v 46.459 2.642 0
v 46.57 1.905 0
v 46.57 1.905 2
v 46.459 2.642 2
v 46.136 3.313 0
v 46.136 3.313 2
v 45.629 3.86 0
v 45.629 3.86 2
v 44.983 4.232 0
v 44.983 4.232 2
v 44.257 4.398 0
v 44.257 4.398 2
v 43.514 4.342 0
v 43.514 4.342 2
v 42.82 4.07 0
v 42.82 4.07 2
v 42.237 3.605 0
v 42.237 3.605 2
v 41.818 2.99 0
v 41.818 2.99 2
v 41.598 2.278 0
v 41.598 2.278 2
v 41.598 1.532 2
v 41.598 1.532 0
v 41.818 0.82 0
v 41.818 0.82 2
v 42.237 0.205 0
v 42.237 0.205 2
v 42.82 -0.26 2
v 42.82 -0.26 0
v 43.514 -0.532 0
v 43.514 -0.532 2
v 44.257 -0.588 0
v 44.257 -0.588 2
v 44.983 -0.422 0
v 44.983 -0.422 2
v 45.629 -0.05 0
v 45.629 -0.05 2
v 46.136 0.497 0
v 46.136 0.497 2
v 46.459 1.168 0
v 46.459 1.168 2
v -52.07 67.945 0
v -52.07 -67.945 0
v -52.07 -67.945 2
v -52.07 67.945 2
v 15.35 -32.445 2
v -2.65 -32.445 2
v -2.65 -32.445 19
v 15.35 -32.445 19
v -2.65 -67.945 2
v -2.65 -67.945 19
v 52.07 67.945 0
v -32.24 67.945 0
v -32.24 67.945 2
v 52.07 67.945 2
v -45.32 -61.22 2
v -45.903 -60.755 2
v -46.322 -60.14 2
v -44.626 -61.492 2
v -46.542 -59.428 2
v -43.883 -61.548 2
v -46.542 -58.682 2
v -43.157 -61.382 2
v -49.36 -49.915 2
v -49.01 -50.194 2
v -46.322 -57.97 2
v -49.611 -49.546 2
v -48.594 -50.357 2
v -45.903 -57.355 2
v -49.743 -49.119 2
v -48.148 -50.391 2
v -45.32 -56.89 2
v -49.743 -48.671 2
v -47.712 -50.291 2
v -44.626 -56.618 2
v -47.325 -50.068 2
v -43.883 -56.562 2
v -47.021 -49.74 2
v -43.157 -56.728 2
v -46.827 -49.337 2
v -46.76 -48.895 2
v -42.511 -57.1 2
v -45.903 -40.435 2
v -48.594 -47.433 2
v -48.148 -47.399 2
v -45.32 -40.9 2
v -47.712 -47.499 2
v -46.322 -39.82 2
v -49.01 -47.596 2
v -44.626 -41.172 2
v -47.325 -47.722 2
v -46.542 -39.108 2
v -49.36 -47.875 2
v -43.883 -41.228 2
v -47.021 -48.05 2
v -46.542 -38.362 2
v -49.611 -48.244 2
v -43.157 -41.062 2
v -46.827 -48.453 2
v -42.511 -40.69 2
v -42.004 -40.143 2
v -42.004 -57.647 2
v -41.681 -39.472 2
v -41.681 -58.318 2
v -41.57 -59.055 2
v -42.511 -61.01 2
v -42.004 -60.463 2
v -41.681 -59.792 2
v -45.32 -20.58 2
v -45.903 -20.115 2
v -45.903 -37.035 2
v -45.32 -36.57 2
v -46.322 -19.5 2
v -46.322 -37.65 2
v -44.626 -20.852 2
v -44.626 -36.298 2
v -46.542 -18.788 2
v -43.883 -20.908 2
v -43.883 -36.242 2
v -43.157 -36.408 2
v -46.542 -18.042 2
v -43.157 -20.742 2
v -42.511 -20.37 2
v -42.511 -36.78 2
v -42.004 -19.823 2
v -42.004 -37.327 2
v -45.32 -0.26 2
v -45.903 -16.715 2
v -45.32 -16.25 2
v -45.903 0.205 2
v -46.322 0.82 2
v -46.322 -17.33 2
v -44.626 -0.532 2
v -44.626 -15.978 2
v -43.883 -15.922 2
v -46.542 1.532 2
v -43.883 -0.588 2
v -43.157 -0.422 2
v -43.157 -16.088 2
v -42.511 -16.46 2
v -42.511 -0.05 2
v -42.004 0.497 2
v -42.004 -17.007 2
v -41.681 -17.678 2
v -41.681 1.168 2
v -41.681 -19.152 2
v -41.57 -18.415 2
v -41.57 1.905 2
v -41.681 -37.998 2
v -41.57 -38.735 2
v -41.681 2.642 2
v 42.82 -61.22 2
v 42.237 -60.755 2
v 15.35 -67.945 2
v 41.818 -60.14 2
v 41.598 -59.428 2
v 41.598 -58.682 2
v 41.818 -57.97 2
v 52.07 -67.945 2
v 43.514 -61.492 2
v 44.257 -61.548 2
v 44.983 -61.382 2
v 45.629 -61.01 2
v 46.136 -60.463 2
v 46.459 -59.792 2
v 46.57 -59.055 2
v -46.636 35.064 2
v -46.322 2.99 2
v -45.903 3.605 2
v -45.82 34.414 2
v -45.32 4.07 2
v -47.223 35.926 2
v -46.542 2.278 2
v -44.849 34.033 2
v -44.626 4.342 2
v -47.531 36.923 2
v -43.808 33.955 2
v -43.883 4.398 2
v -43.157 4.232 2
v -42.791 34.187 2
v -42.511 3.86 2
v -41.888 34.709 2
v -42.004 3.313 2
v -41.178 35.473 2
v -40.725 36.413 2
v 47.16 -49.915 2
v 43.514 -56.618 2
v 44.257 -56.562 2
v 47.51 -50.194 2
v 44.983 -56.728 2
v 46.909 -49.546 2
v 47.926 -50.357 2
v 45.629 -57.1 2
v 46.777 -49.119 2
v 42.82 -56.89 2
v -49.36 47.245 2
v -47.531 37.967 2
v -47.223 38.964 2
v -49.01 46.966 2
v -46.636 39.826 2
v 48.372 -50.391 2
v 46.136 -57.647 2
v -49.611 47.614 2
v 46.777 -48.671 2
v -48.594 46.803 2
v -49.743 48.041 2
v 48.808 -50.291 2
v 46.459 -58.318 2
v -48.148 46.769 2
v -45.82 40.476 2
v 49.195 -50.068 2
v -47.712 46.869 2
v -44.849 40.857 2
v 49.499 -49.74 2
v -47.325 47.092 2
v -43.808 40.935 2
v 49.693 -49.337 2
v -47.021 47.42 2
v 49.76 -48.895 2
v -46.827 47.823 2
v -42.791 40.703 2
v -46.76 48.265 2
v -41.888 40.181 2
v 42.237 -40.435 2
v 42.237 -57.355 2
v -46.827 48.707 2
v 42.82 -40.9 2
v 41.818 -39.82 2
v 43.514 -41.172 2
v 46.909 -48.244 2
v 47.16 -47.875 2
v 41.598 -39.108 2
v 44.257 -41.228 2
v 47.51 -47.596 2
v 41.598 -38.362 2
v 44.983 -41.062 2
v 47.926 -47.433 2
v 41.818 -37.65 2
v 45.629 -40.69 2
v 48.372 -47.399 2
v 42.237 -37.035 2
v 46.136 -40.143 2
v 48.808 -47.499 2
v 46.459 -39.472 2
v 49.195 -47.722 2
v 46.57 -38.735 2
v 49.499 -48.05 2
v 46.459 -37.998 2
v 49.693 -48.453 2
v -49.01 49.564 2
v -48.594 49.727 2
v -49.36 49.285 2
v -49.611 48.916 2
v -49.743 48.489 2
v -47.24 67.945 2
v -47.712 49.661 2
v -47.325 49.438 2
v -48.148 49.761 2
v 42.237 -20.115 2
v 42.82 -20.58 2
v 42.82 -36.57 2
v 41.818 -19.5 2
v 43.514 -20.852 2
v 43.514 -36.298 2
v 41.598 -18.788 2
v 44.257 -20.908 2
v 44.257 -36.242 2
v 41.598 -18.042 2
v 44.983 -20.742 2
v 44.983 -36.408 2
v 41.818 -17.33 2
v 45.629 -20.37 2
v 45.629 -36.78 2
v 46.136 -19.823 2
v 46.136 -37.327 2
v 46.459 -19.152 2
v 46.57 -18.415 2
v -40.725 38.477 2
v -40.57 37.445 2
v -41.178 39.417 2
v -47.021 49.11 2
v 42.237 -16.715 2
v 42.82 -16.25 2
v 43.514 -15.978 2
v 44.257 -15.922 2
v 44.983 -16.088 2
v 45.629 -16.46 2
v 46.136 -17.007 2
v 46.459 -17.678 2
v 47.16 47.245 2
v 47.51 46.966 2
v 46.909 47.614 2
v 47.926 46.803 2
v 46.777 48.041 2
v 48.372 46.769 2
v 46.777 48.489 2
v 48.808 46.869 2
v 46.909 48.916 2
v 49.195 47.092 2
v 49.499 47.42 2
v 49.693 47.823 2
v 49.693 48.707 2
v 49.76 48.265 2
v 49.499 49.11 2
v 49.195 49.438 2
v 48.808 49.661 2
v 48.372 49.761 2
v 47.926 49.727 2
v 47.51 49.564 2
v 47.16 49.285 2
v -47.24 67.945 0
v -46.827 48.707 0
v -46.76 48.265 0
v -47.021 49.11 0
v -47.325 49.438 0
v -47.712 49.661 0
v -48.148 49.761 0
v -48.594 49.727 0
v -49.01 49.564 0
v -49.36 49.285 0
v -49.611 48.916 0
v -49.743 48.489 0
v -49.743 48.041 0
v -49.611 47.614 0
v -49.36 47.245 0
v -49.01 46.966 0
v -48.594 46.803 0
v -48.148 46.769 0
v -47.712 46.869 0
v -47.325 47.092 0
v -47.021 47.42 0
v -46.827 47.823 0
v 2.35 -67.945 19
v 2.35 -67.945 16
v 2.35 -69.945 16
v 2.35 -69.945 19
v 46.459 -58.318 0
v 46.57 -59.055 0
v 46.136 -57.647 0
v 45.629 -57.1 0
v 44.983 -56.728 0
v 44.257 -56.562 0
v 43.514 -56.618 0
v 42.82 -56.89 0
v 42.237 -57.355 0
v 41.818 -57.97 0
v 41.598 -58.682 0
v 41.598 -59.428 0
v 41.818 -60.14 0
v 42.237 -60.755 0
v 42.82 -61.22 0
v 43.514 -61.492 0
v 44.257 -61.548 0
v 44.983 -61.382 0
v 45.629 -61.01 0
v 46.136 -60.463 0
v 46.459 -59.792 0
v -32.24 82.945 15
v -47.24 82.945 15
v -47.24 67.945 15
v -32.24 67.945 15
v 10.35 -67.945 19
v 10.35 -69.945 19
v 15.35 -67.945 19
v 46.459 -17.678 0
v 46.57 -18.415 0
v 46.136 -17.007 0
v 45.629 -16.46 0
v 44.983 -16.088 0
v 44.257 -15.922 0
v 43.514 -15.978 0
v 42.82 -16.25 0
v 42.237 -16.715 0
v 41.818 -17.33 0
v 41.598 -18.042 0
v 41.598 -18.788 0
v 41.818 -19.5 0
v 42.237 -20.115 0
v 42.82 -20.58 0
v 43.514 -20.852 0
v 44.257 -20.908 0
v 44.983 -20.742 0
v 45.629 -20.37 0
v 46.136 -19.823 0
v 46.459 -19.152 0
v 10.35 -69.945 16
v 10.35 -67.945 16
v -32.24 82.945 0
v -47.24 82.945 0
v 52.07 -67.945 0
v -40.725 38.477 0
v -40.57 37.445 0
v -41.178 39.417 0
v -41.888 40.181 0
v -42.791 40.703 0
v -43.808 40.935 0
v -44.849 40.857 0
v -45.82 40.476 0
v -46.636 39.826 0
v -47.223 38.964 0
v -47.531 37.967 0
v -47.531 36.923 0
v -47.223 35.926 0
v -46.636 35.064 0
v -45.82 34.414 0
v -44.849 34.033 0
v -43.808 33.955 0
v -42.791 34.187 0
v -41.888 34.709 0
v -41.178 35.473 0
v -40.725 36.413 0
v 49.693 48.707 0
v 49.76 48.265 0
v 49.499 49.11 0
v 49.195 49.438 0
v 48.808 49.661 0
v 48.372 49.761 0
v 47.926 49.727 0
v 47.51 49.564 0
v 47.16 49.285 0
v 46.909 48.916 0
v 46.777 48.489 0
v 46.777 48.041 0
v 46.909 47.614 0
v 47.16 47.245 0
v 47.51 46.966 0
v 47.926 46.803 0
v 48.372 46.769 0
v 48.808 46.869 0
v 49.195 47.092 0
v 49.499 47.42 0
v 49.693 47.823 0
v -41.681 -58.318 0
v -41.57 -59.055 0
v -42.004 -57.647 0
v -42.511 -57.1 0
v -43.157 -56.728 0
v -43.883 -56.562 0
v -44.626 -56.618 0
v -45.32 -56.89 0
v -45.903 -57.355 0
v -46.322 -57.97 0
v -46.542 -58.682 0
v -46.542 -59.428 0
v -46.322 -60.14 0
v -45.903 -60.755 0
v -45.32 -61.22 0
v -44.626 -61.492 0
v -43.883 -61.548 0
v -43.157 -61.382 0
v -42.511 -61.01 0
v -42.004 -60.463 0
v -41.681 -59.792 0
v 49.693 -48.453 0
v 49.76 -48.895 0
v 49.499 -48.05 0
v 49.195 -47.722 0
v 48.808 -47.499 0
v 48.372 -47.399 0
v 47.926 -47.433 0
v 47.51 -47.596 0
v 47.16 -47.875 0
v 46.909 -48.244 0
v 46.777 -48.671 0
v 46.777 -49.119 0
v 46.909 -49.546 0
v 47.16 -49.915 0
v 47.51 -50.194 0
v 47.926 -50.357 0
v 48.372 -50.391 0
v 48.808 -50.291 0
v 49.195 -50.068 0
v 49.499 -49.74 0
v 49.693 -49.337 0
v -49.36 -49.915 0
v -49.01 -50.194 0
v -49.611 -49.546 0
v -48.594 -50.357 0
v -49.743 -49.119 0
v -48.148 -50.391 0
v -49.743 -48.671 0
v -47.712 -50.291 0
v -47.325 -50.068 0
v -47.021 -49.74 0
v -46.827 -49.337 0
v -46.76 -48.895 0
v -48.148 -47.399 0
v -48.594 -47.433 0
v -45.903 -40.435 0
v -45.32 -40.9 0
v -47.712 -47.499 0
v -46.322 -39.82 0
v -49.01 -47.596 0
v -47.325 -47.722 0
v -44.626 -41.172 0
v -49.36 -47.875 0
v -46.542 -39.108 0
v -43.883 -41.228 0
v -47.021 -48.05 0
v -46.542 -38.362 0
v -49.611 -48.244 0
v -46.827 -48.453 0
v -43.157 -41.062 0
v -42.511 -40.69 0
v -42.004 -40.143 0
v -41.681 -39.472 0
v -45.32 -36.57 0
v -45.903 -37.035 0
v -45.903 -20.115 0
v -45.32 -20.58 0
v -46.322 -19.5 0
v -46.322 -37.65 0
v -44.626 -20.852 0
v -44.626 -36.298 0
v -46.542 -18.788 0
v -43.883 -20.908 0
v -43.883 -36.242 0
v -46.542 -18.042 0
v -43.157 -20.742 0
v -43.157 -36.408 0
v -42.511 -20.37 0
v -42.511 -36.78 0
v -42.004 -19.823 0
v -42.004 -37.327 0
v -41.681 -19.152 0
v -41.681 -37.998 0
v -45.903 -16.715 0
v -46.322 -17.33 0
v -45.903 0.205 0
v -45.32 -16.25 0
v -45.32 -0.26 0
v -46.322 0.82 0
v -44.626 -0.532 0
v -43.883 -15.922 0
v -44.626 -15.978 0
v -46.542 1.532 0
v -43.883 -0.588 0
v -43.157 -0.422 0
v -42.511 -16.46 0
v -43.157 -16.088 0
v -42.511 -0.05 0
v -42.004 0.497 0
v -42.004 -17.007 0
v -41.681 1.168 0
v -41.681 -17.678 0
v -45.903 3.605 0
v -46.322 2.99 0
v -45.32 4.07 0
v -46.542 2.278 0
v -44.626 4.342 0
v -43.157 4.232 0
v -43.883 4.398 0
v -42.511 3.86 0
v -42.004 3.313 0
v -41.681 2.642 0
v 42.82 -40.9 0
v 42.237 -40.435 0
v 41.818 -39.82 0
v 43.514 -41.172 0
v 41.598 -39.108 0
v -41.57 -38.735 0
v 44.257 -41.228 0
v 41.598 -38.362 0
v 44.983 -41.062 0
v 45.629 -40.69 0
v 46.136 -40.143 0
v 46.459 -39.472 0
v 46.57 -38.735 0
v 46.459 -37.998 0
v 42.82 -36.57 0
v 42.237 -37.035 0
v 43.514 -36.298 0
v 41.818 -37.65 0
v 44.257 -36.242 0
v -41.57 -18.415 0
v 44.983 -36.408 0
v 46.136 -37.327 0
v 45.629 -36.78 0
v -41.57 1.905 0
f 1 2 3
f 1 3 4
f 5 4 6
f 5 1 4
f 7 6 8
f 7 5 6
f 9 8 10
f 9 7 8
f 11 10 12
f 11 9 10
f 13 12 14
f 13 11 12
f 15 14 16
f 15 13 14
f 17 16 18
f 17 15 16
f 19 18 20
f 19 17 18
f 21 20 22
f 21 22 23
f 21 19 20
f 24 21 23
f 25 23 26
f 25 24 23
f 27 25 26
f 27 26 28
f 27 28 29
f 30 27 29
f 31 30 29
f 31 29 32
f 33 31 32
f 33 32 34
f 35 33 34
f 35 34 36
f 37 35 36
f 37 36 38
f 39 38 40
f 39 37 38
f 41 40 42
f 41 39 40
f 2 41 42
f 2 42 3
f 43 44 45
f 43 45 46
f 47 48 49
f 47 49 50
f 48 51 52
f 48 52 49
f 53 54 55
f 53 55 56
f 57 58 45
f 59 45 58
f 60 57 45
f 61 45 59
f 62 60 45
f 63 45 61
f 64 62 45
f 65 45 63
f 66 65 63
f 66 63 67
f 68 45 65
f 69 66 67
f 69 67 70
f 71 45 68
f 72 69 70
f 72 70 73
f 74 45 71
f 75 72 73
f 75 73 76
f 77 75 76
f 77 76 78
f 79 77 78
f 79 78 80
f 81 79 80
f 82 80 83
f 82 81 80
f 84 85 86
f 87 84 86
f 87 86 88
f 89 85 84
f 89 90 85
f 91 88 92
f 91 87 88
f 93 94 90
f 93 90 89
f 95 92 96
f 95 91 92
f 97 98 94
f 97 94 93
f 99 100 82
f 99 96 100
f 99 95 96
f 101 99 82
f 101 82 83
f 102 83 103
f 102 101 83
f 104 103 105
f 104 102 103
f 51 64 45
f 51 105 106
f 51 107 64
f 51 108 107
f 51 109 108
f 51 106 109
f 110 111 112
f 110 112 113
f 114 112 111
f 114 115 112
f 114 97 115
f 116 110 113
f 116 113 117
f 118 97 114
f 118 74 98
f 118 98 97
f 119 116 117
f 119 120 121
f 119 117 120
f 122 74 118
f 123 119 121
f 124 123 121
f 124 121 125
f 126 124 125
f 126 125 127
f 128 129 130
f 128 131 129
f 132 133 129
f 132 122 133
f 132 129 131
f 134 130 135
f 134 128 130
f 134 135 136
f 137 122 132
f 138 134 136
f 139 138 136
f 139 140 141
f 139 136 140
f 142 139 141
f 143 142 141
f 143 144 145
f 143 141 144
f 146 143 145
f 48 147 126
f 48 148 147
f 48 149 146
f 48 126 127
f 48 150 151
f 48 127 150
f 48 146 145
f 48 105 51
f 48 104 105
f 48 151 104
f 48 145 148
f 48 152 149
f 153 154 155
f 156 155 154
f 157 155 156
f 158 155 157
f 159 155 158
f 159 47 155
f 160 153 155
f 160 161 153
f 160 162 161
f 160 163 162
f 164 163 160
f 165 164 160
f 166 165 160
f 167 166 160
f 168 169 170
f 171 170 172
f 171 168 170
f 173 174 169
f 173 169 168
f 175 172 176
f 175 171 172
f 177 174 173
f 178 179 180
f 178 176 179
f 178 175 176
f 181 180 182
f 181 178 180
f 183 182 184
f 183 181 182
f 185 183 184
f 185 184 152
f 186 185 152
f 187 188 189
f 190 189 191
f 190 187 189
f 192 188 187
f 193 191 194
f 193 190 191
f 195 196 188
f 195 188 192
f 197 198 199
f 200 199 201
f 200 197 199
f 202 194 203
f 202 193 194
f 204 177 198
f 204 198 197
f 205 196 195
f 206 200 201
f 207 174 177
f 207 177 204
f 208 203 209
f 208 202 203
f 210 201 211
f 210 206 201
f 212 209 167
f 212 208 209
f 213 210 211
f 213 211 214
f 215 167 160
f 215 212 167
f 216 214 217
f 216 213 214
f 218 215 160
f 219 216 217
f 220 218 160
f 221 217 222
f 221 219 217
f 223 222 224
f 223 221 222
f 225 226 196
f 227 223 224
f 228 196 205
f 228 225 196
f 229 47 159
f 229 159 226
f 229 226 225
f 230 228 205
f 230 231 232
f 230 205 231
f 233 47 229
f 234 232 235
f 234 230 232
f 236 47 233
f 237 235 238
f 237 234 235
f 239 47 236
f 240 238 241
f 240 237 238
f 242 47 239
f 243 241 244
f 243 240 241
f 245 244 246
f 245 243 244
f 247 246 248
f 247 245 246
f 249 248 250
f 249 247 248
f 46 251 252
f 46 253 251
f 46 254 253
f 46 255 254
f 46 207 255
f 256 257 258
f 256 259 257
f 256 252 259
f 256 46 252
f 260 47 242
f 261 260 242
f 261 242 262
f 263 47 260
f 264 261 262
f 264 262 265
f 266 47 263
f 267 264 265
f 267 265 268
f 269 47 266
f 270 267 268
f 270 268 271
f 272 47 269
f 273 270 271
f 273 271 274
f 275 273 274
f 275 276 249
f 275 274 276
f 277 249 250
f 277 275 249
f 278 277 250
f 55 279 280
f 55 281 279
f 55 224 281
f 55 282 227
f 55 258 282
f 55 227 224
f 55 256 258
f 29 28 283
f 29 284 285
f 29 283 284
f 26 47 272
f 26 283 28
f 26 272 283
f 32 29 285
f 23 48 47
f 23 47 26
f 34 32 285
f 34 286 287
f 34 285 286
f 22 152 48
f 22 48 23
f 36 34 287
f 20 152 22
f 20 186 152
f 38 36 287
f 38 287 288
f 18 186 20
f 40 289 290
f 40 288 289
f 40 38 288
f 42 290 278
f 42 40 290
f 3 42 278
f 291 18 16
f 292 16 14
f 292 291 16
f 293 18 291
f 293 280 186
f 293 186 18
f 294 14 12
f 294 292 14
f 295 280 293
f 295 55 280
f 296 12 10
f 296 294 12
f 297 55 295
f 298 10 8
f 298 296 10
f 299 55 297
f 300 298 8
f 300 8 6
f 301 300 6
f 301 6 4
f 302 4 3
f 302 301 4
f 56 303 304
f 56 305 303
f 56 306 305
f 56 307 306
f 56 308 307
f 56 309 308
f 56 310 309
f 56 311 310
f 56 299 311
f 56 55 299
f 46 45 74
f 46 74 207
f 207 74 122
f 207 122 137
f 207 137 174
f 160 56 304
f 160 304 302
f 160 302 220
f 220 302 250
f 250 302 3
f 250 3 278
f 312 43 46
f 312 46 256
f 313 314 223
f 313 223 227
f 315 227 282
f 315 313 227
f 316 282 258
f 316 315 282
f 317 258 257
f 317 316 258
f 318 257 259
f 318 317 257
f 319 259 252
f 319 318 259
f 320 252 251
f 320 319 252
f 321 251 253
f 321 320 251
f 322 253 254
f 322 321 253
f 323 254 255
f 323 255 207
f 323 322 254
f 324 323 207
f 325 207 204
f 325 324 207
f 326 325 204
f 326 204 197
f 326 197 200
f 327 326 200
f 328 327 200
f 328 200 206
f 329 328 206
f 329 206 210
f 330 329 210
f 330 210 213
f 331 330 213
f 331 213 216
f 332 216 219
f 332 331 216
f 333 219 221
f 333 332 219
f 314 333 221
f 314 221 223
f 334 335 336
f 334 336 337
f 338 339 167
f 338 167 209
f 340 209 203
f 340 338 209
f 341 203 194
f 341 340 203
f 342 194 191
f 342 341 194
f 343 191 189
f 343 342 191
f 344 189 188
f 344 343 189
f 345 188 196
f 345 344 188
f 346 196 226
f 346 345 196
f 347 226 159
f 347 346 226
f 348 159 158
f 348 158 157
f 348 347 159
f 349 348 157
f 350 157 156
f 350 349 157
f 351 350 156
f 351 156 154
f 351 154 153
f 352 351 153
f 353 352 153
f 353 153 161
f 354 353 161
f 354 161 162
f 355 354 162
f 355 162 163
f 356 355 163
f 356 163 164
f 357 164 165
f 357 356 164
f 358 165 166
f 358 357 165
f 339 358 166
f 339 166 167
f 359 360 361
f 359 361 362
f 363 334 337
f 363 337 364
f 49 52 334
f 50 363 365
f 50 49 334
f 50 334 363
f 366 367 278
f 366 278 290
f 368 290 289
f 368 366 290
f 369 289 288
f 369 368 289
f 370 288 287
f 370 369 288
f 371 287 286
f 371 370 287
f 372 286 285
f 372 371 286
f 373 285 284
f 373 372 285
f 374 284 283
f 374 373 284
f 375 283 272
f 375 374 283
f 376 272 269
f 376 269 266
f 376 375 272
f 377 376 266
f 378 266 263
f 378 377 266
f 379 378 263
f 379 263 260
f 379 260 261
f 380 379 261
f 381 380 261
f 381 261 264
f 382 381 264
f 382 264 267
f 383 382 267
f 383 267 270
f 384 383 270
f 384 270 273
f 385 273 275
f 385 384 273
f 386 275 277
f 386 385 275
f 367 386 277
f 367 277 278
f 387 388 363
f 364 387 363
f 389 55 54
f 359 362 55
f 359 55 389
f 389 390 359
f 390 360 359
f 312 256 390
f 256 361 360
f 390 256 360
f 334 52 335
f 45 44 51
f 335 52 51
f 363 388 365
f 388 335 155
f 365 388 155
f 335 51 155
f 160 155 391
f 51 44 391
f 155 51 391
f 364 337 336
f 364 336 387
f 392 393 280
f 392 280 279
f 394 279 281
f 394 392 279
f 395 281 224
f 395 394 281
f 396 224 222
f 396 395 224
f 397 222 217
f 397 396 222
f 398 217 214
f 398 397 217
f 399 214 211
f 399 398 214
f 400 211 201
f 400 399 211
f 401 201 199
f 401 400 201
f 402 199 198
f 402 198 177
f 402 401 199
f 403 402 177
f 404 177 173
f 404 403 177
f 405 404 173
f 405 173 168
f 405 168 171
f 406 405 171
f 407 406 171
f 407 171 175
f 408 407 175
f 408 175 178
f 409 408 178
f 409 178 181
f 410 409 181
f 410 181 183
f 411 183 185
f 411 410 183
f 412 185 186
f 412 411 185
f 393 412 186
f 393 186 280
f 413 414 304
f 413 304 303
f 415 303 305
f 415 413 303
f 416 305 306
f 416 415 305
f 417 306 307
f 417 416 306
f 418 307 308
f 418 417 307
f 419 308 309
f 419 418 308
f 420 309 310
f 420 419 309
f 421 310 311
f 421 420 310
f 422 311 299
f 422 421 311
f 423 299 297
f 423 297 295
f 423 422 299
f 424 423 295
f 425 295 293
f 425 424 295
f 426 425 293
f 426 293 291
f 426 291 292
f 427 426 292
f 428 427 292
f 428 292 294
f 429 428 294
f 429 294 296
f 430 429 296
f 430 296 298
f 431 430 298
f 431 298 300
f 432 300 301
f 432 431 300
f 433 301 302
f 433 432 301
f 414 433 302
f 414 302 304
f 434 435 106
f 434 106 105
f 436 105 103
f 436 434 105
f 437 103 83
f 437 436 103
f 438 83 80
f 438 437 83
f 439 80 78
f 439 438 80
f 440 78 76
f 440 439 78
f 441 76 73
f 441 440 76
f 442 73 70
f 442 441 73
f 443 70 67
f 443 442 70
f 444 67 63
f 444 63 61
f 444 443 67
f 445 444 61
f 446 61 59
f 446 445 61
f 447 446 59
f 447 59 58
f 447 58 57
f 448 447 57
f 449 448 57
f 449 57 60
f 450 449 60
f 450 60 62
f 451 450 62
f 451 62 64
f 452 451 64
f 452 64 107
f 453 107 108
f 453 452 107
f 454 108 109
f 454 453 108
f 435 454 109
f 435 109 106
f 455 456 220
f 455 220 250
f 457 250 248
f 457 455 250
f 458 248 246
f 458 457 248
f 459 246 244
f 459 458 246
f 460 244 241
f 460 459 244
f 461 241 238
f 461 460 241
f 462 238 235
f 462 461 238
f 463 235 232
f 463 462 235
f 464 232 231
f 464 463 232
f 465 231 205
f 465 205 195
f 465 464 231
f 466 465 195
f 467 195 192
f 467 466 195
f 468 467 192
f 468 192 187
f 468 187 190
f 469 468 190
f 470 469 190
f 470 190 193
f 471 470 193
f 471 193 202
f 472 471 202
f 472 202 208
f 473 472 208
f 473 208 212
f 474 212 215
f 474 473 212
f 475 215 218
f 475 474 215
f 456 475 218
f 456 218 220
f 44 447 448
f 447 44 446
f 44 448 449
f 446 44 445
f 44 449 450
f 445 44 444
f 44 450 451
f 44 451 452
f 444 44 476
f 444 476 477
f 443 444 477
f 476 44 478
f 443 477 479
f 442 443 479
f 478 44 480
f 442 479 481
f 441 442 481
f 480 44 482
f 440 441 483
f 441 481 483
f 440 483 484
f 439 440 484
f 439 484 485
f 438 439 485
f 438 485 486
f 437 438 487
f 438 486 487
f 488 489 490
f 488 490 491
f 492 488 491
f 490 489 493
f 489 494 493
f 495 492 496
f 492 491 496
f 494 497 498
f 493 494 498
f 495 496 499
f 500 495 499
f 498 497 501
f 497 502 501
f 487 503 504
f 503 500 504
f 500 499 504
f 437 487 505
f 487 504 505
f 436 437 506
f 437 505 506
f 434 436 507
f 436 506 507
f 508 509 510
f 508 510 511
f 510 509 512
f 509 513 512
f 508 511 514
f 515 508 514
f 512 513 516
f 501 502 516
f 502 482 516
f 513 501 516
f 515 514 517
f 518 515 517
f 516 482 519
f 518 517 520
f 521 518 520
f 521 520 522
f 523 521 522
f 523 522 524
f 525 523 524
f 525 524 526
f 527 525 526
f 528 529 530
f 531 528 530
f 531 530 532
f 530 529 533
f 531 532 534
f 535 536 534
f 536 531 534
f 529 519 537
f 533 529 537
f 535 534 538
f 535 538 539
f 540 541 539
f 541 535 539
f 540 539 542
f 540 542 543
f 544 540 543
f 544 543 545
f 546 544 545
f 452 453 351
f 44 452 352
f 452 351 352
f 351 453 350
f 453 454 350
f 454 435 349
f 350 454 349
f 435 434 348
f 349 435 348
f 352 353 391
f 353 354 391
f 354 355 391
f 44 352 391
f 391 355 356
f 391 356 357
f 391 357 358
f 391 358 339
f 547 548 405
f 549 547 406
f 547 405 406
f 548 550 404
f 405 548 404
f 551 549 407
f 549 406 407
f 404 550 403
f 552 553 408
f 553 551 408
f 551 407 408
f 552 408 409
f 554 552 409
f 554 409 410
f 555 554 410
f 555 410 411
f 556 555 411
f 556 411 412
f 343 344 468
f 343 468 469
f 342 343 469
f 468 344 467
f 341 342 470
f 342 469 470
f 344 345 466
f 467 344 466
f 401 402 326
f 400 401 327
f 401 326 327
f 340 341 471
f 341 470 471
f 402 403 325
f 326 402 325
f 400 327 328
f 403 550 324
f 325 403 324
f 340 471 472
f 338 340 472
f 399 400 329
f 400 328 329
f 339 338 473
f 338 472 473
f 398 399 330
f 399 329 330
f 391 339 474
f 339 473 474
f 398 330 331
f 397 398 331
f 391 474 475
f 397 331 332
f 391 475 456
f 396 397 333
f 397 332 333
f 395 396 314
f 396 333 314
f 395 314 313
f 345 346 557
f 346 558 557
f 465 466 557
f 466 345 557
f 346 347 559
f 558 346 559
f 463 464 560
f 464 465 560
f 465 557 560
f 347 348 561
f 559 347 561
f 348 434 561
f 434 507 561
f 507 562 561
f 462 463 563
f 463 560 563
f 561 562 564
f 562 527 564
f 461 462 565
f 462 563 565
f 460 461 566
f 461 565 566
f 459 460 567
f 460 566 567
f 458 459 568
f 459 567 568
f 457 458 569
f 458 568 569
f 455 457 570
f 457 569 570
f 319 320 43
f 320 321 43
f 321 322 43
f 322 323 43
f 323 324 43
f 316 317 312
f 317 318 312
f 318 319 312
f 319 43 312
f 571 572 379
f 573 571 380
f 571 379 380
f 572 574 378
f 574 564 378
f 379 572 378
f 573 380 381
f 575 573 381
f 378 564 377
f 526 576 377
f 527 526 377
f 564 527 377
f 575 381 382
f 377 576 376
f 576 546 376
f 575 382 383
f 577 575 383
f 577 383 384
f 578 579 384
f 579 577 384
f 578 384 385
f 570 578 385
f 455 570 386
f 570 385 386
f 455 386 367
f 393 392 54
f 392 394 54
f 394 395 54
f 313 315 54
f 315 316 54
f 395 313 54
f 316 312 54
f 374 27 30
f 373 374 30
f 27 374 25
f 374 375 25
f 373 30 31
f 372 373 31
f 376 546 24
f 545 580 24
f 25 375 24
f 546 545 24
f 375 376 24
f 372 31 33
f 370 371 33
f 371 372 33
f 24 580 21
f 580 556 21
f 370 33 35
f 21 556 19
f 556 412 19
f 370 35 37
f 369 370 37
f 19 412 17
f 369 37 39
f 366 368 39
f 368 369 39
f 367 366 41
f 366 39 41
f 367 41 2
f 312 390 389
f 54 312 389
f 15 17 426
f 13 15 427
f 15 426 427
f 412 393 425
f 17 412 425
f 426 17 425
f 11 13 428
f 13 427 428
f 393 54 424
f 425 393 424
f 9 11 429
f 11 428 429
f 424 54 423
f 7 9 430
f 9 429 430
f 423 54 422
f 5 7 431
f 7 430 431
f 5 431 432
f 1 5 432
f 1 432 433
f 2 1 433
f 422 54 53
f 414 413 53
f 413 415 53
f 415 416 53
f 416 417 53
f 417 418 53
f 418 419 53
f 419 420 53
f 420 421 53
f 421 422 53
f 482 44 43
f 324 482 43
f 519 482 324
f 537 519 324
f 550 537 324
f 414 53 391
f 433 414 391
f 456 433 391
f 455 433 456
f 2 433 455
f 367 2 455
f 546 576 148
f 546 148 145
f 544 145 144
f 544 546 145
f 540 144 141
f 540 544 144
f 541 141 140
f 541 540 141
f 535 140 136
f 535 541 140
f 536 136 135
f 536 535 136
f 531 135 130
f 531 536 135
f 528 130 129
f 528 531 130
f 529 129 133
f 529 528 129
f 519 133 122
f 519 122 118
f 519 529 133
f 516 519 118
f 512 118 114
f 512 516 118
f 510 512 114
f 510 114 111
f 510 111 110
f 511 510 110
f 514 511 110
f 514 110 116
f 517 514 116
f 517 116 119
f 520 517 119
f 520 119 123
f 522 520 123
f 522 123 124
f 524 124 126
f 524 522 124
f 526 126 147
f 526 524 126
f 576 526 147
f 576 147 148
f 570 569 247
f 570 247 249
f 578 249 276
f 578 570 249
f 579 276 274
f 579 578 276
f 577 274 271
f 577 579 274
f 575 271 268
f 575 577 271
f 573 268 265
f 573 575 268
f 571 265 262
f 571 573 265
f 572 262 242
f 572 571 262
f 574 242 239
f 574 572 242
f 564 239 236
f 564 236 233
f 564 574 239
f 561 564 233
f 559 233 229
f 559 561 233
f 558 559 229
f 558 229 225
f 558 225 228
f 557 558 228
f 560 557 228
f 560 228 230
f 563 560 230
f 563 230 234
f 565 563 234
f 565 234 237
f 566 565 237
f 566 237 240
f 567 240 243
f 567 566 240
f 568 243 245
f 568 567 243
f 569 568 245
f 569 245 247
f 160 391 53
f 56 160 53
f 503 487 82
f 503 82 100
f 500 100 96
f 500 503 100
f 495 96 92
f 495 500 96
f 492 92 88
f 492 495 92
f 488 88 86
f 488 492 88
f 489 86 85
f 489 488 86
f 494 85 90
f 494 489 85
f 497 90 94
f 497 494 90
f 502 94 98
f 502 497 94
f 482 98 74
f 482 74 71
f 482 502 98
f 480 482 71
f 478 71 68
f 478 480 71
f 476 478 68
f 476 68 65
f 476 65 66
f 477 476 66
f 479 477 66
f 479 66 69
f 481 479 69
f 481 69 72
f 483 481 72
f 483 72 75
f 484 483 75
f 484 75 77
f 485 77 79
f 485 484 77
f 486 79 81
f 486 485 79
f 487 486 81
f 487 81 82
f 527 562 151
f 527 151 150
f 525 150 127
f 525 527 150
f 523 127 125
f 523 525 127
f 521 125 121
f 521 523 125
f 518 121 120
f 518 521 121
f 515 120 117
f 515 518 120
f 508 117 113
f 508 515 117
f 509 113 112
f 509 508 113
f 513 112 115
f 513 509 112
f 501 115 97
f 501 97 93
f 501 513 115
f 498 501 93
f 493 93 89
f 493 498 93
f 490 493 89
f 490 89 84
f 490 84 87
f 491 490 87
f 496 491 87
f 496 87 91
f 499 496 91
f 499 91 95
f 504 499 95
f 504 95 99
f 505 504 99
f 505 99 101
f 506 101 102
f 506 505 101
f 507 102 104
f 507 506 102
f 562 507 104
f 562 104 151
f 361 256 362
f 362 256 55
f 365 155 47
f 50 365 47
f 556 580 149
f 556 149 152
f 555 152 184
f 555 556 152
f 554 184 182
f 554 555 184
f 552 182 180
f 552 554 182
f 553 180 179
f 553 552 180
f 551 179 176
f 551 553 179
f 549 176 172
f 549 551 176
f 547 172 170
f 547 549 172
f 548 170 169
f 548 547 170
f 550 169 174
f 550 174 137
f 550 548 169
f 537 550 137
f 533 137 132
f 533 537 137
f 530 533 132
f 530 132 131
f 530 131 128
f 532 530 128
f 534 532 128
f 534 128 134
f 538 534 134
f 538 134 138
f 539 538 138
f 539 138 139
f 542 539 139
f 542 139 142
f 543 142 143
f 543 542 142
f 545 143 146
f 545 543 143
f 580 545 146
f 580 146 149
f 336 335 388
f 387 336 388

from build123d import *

# Parameters (mm, degrees)
F0_W          = 104.14
F0_H          = 135.89
F0_R          = 2.5
F0_R_2        = 1.5
F0_R_3        = 3.5
F1_DEPTH      = 2
F3_W          = 15
F3_H          = 15
F4_DEPTH      = 13
F4_DEPTH_BACK = 2
F5_W          = 18
F5_H          = 35.5
F6_DEPTH      = 17
F8_W          = 8
F8_H          = 3
F9_DEPTH      = 2


with BuildPart() as f1:
    # F0 (on Top) → F1 (new body)
    with BuildSketch(Plane.XY):
        Rectangle(F0_W, F0_H)
        with Locations((-44.07, -59.055)):
            Circle(F0_R, mode=Mode.SUBTRACT)
        with Locations((-48.26, -48.895)):
            Circle(F0_R_2, mode=Mode.SUBTRACT)
        with Locations((-44.07, -38.735)):
            Circle(F0_R, mode=Mode.SUBTRACT)
        with Locations((-44.07, -18.415)):
            Circle(F0_R, mode=Mode.SUBTRACT)
        with Locations((44.07, -59.055)):
            Circle(F0_R, mode=Mode.SUBTRACT)
        with Locations((48.26, -48.895)):
            Circle(F0_R_2, mode=Mode.SUBTRACT)
        with Locations((44.07, -38.735)):
            Circle(F0_R, mode=Mode.SUBTRACT)
        with Locations((44.07, -18.415)):
            Circle(F0_R, mode=Mode.SUBTRACT)
        with Locations((-44.07, 1.905)):
            Circle(F0_R, mode=Mode.SUBTRACT)
        with Locations((-44.07, 37.445)):
            Circle(F0_R_3, mode=Mode.SUBTRACT)
        with Locations((-48.26, 48.265)):
            Circle(F0_R_2, mode=Mode.SUBTRACT)
        with Locations((44.07, 1.905)):
            Circle(F0_R, mode=Mode.SUBTRACT)
        with Locations((48.26, 48.265)):
            Circle(F0_R_2, mode=Mode.SUBTRACT)
    extrude(amount=F1_DEPTH)

    # F3 (on offset) → F4 (join, two sides)
    with BuildSketch(Plane.XY.offset(2)) as f4_sk:
        with Locations((-39.74, 75.445)):
            Rectangle(F3_W, F3_H)
    extrude(amount=F4_DEPTH)
    extrude(f4_sk.sketch, amount=-F4_DEPTH_BACK)

    # F5 (on offset) → F6 (join)
    with BuildSketch(Plane.XY.offset(2)):
        with Locations((6.35, -50.195)):
            Rectangle(F5_W, F5_H)
    extrude(amount=F6_DEPTH)

    # F8 (on offset) → F9 (join)
    with BuildSketch(Plane.XZ.offset(67.945)):
        with Locations((6.35, 17.5)):
            Rectangle(F8_W, F8_H)
    extrude(amount=F9_DEPTH)


solid = f1.part
